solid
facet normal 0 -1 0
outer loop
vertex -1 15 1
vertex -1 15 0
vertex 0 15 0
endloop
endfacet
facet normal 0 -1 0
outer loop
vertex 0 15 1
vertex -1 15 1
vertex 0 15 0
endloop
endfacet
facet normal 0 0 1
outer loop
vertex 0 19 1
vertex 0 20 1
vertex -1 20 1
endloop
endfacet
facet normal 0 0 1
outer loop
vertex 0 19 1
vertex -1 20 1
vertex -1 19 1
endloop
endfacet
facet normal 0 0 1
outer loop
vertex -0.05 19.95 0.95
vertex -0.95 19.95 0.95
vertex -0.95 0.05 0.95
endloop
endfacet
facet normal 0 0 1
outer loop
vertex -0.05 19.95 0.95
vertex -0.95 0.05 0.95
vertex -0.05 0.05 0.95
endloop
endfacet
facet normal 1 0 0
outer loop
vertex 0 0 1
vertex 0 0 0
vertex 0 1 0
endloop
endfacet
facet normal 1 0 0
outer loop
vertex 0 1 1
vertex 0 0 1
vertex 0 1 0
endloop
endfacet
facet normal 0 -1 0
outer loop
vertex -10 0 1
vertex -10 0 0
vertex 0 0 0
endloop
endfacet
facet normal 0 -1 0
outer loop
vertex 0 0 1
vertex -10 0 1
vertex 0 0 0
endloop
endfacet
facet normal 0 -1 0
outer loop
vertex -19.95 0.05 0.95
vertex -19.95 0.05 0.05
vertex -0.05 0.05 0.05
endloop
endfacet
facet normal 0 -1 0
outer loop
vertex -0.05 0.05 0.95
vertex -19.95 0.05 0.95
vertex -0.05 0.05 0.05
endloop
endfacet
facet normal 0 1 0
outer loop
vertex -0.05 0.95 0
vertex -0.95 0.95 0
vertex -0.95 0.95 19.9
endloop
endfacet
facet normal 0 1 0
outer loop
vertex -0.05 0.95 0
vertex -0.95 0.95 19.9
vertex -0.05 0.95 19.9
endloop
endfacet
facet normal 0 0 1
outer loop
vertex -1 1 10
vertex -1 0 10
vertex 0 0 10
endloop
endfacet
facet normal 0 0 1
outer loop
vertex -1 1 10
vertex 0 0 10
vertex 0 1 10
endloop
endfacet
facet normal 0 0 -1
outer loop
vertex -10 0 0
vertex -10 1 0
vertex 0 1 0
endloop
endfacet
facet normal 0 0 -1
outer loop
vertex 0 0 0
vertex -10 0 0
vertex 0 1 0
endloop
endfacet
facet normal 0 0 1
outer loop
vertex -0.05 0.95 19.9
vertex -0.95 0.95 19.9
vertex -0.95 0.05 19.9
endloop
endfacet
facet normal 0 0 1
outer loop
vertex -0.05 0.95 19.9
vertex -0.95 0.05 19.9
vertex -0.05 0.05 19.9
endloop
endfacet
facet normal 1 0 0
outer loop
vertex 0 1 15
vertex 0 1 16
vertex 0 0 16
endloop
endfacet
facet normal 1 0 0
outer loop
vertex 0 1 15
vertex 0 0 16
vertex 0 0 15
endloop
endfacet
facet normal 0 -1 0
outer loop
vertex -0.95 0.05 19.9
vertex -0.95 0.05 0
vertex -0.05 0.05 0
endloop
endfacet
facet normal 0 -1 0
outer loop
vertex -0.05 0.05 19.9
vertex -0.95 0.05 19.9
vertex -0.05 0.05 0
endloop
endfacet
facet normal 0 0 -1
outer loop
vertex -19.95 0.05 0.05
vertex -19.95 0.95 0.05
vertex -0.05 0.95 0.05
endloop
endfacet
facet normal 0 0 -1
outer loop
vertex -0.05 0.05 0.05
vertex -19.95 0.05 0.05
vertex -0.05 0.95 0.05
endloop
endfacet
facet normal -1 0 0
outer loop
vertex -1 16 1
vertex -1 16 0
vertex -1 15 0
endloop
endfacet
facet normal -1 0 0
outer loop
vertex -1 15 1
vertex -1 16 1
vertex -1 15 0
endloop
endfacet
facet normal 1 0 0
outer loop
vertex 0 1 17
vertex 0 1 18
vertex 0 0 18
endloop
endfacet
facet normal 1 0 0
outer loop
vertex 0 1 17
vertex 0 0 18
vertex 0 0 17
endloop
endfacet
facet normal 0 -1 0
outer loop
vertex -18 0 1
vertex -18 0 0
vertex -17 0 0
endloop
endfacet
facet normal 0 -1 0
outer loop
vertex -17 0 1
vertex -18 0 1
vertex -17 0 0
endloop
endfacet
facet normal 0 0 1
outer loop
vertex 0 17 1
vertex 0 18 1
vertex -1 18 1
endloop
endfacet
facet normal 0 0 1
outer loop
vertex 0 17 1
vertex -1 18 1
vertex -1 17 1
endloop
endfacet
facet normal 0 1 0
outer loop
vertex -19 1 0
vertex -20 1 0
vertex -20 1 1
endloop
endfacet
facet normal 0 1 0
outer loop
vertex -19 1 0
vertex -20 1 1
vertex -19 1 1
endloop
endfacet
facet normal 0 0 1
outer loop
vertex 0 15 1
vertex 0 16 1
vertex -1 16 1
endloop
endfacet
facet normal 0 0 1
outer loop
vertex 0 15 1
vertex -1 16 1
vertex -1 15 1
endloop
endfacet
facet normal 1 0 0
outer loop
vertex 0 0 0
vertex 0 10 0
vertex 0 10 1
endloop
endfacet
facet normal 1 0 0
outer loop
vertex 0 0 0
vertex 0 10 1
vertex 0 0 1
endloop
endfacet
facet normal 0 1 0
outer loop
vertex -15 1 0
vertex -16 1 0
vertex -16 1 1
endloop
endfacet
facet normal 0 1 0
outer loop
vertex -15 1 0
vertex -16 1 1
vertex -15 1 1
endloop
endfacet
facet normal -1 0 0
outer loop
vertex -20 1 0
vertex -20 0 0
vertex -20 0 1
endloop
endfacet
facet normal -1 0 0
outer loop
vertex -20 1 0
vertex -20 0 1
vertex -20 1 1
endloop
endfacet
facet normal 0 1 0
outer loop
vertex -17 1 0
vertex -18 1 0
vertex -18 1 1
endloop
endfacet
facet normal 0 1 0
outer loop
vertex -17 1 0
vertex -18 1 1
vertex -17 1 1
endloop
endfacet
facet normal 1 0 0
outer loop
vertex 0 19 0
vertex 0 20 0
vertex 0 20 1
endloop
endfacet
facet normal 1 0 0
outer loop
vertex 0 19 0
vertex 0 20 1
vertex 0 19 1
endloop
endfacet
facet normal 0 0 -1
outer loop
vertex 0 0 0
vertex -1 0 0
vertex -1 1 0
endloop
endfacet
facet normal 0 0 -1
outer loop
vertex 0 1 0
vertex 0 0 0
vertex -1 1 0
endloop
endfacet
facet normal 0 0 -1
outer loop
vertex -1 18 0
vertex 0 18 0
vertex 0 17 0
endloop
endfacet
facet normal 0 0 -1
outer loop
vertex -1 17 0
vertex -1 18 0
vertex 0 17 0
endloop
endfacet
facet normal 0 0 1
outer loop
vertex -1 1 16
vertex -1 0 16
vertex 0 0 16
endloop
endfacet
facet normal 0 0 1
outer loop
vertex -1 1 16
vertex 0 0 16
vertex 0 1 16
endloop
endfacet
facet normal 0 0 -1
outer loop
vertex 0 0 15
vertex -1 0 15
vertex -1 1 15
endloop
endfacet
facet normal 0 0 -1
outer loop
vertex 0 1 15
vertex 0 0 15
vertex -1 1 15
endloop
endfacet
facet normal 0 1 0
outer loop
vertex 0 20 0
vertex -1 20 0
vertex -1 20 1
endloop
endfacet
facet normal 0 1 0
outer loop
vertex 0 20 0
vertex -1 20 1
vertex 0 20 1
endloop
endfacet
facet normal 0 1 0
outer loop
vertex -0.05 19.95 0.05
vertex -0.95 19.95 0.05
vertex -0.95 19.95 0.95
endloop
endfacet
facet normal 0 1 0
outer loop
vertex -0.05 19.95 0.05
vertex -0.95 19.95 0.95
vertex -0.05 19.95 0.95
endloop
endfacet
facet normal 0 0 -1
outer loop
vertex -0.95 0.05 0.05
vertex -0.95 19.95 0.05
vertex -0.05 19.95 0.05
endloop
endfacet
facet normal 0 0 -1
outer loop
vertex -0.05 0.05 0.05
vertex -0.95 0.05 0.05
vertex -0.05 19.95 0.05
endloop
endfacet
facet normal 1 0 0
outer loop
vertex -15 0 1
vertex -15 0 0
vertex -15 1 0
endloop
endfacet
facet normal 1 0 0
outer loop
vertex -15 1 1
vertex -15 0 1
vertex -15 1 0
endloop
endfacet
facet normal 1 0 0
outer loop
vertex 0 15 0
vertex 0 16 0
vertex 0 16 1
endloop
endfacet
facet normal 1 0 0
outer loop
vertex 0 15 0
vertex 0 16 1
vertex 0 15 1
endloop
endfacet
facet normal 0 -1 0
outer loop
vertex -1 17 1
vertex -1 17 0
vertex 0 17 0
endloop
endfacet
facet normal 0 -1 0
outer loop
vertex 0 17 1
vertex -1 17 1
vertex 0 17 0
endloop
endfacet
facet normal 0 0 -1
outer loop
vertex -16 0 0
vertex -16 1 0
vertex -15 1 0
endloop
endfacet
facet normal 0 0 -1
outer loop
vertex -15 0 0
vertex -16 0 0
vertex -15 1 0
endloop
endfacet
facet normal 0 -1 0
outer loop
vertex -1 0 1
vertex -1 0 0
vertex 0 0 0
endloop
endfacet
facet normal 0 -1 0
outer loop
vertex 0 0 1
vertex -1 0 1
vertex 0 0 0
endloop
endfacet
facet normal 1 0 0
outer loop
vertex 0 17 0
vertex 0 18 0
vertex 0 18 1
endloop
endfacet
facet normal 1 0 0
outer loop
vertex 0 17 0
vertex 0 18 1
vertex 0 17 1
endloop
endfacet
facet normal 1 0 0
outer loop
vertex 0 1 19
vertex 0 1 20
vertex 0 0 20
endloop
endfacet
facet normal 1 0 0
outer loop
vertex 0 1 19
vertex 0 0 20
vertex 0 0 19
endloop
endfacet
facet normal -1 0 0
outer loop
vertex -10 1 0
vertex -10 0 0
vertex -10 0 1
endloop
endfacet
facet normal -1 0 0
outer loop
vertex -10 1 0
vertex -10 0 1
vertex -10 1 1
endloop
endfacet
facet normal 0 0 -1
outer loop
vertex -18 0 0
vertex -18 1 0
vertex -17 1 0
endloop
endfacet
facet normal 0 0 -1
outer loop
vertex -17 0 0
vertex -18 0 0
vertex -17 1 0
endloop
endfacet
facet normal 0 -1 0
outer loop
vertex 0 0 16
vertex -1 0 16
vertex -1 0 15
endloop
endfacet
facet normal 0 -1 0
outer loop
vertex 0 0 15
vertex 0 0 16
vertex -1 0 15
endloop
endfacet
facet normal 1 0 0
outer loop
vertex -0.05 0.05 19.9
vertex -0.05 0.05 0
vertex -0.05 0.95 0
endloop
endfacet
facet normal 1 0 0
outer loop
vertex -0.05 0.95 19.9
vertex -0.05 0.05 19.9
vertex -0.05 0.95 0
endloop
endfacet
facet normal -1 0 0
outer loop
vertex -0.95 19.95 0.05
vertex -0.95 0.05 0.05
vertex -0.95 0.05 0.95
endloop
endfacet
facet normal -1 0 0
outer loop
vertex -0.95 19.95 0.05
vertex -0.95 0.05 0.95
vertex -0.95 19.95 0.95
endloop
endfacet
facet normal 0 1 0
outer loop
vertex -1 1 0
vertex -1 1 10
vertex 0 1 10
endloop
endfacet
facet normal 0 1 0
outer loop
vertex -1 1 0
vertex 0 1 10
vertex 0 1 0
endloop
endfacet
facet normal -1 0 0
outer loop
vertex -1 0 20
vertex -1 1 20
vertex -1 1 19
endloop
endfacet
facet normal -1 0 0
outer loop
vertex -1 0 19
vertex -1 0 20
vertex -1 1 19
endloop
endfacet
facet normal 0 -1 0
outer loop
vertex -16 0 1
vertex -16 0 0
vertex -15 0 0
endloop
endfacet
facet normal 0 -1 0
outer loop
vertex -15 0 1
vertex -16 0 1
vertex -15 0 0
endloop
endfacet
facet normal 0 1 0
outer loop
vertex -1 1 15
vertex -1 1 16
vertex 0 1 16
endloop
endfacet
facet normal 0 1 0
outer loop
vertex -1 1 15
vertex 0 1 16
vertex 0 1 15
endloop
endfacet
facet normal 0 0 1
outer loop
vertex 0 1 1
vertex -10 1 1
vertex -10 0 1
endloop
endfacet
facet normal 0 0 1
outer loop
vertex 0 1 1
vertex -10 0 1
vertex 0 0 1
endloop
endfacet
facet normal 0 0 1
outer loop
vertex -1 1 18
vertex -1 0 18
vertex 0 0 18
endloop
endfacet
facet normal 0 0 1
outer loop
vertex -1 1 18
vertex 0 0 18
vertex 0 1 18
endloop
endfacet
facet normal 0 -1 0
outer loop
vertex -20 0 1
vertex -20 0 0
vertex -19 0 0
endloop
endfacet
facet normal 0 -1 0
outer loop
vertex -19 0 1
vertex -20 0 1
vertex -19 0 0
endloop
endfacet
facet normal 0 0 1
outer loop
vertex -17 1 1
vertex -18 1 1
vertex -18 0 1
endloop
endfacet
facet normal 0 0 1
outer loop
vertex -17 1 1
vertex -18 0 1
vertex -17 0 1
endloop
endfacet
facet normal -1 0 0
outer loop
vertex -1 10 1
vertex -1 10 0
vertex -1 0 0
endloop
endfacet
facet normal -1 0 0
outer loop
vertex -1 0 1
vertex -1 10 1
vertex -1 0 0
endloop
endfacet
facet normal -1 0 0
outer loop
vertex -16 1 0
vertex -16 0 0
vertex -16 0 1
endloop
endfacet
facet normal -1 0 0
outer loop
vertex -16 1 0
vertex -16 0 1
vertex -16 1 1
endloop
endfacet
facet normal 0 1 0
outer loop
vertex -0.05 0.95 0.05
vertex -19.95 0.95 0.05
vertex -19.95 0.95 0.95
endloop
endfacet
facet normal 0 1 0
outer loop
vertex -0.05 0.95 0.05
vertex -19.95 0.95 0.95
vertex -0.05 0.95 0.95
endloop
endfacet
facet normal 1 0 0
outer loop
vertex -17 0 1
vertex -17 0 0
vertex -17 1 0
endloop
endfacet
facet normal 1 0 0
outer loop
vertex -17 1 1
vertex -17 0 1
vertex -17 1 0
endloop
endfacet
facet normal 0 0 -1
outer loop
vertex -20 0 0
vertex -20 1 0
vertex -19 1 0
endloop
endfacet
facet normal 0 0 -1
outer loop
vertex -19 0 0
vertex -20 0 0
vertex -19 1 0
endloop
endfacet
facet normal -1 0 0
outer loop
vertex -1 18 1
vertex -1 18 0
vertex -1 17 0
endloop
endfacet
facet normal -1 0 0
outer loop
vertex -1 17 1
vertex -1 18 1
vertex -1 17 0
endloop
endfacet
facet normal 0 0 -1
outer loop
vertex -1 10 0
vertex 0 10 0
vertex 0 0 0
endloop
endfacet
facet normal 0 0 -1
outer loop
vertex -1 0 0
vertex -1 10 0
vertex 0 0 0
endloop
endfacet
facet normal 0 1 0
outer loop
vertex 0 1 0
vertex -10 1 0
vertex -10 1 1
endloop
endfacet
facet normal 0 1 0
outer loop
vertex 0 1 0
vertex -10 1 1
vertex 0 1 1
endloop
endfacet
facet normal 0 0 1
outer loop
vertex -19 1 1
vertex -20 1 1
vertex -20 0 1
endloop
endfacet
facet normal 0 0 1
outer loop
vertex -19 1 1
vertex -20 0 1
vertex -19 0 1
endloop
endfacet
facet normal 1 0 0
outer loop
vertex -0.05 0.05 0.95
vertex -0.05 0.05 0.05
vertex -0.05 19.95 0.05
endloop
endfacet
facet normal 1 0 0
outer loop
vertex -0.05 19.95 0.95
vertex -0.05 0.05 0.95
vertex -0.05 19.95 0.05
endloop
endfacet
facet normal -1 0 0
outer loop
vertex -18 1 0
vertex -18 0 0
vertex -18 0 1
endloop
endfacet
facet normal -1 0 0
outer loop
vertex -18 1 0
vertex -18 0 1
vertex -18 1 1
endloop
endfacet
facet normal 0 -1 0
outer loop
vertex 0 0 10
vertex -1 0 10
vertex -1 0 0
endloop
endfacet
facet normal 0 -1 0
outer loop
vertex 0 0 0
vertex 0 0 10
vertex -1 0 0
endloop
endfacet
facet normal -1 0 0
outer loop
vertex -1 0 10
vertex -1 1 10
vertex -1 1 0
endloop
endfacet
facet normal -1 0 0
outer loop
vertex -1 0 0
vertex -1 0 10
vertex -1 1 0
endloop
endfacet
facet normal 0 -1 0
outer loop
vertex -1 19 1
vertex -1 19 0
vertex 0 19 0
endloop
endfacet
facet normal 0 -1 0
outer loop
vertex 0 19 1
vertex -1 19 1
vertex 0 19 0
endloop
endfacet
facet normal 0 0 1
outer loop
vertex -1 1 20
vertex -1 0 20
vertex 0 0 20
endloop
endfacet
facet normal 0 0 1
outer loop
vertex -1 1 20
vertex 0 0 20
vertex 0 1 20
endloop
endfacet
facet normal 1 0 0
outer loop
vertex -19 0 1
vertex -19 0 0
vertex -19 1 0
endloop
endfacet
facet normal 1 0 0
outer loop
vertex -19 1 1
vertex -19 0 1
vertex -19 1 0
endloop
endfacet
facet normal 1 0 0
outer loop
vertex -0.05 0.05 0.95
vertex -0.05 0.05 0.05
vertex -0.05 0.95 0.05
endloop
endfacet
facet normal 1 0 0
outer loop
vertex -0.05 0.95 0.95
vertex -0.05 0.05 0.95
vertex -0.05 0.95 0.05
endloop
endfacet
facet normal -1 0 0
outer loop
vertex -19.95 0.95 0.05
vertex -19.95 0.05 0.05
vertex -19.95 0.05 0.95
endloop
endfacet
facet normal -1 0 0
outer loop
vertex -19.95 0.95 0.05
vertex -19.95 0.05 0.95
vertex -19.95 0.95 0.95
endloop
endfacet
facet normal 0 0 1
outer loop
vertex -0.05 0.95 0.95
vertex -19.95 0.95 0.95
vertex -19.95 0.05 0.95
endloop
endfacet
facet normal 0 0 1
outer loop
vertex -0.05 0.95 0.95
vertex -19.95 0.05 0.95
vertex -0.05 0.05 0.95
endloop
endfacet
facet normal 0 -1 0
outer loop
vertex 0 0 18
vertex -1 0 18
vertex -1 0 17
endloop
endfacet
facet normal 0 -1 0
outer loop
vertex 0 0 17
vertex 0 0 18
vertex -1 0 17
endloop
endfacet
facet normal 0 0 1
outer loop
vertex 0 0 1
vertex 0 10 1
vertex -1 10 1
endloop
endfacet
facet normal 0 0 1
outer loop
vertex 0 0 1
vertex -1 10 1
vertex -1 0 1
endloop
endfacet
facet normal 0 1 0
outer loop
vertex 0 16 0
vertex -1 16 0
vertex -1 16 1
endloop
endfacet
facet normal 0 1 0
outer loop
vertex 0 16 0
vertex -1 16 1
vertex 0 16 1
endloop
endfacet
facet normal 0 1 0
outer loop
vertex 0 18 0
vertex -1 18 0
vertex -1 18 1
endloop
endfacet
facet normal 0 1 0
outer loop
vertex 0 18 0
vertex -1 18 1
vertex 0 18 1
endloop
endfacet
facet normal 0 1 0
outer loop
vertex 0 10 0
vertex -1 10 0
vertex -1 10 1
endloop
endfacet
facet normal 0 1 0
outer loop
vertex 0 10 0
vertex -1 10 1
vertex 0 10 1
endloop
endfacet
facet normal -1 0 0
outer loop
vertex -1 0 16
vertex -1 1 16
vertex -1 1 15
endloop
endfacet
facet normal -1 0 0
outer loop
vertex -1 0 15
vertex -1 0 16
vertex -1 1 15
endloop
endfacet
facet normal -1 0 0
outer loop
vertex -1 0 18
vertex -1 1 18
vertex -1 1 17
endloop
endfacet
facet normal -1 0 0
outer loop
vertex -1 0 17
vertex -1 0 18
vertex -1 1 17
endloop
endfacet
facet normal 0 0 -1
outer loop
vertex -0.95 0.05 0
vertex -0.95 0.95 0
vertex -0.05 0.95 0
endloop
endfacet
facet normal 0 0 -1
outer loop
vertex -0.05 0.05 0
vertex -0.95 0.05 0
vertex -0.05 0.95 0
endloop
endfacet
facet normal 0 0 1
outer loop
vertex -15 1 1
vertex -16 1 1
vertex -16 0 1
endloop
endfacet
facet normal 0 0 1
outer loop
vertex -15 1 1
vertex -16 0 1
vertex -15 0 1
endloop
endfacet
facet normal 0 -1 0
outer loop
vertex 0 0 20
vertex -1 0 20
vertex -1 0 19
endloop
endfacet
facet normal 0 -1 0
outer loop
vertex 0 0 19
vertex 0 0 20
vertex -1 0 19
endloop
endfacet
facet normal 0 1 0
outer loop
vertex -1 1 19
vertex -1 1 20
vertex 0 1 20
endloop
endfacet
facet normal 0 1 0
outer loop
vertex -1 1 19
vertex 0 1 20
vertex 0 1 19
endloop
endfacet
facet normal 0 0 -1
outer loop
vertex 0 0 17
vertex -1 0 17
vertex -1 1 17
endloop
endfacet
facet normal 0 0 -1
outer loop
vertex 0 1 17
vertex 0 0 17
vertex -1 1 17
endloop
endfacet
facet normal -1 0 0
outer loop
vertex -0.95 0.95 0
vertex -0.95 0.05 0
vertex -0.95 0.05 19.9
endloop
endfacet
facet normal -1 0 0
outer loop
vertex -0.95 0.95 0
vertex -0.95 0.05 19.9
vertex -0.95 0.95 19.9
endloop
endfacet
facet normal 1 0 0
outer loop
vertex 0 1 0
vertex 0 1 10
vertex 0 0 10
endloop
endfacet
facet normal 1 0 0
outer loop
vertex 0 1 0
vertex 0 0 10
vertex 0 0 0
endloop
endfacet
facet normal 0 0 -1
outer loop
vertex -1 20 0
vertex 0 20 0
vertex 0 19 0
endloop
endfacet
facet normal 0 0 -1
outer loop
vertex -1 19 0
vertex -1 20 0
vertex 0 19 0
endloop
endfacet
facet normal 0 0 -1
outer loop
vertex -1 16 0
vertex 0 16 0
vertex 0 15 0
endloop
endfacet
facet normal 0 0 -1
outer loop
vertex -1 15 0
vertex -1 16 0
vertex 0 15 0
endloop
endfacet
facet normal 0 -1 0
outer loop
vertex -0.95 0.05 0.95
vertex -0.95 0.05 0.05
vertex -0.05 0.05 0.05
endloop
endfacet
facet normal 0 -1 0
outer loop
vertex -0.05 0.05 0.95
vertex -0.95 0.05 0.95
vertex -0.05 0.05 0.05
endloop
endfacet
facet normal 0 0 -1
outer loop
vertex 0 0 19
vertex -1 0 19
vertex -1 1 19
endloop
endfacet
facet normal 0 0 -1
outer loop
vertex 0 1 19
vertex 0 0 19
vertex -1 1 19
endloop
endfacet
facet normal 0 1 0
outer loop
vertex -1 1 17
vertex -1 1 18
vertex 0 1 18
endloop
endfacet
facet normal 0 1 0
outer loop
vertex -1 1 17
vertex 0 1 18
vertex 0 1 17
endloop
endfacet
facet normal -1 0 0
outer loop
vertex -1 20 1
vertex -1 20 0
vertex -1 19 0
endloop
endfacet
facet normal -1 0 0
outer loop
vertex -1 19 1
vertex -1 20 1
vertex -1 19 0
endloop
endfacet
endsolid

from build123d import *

# Parameters (mm, degrees)
BOX_W        = 10
BOX_H        = 1
BOX_DEPTH    = 1
BOX001_W     = 1
BOX001_H     = 1
BOX001_DEPTH = 1
BOX002_W     = 1
BOX002_H     = 1
BOX002_DEPTH = 1
BOX003_W     = 1
BOX003_H     = 1
BOX003_DEPTH = 1
BOX004_W     = 10
BOX004_H     = 1
BOX004_DEPTH = 1
BOX005_W     = 1
BOX005_H     = 1
BOX005_DEPTH = 1
BOX006_W     = 1
BOX006_H     = 1
BOX006_DEPTH = 1
BOX007_W     = 1
BOX007_H     = 1
BOX007_DEPTH = 1
BOX010_W     = 1
BOX010_H     = 1
BOX010_DEPTH = 1
BOX008_W     = 10
BOX008_H     = 1
BOX008_DEPTH = 1
BOX009_W     = 1
BOX009_H     = 1
BOX009_DEPTH = 1
BOX011_W     = 1
BOX011_H     = 1
BOX011_DEPTH = 1
BOX012_W     = 0.9
BOX012_H     = 0.9
BOX012_DEPTH = 19.9
BOX013_W     = 19.9
BOX013_H     = 0.9
BOX013_DEPTH = 0.9
BOX014_W     = 0.9
BOX014_H     = 19.9
BOX014_DEPTH = 0.9


with BuildPart() as cube:
    # Box → Box (new body)
    with BuildSketch(Plane(origin=(-10, 0, 0), x_dir=(1, 0, 0), z_dir=(0, 0, 1))):
        with Locations((5, 0.5)):
            Rectangle(BOX_W, BOX_H)
    extrude(amount=BOX_DEPTH)


with BuildPart() as cube001:
    # Box001 → Box001 (new body)
    with BuildSketch(Plane(origin=(-16, 0, 0), x_dir=(1, 0, 0), z_dir=(0, 0, 1))):
        with Locations((0.5, 0.5)):
            Rectangle(BOX001_W, BOX001_H)
    extrude(amount=BOX001_DEPTH)


with BuildPart() as cube002:
    # Box002 → Box002 (new body)
    with BuildSketch(Plane(origin=(-18, 0, 0), x_dir=(1, 0, 0), z_dir=(0, 0, 1))):
        with Locations((0.5, 0.5)):
            Rectangle(BOX002_W, BOX002_H)
    extrude(amount=BOX002_DEPTH)


with BuildPart() as cube003:
    # Box003 → Box003 (new body)
    with BuildSketch(Plane(origin=(-20, 0, 0), x_dir=(1, 0, 0), z_dir=(0, 0, 1))):
        with Locations((0.5, 0.5)):
            Rectangle(BOX003_W, BOX003_H)
    extrude(amount=BOX003_DEPTH)


with BuildPart() as cube004:
    # Box004 → Box004 (new body)
    with BuildSketch(Plane(origin=(-1, 10, 0), x_dir=(0, -1, 0), z_dir=(0, 0, 1))):
        with Locations((5, 0.5)):
            Rectangle(BOX004_W, BOX004_H)
    extrude(amount=BOX004_DEPTH)


with BuildPart() as cube005:
    # Box005 → Box005 (new body)
    with BuildSketch(Plane(origin=(-1, 16, 0), x_dir=(0, -1, 0), z_dir=(0, 0, 1))):
        with Locations((0.5, 0.5)):
            Rectangle(BOX005_W, BOX005_H)
    extrude(amount=BOX005_DEPTH)


with BuildPart() as cube006:
    # Box006 → Box006 (new body)
    with BuildSketch(Plane(origin=(-1, 18, 0), x_dir=(0, -1, 0), z_dir=(0, 0, 1))):
        with Locations((0.5, 0.5)):
            Rectangle(BOX006_W, BOX006_H)
    extrude(amount=BOX006_DEPTH)


with BuildPart() as cube007:
    # Box007 → Box007 (new body)
    with BuildSketch(Plane(origin=(-1, 20, 0), x_dir=(0, -1, 0), z_dir=(0, 0, 1))):
        with Locations((0.5, 0.5)):
            Rectangle(BOX007_W, BOX007_H)
    extrude(amount=BOX007_DEPTH)


with BuildPart() as cube010:
    # Box010 → Box010 (new body)
    with BuildSketch(Plane(origin=(-1, 0, 18), x_dir=(0, 0, -1), z_dir=(1, 0, 0))):
        with Locations((0.5, 0.5)):
            Rectangle(BOX010_W, BOX010_H)
    extrude(amount=BOX010_DEPTH)


with BuildPart() as cube008:
    # Box008 → Box008 (new body)
    with BuildSketch(Plane(origin=(-1, 0, 10), x_dir=(0, 0, -1), z_dir=(1, 0, 0))):
        with Locations((5, 0.5)):
            Rectangle(BOX008_W, BOX008_H)
    extrude(amount=BOX008_DEPTH)


with BuildPart() as cube009:
    # Box009 → Box009 (new body)
    with BuildSketch(Plane(origin=(-1, 0, 16), x_dir=(0, 0, -1), z_dir=(1, 0, 0))):
        with Locations((0.5, 0.5)):
            Rectangle(BOX009_W, BOX009_H)
    extrude(amount=BOX009_DEPTH)


with BuildPart() as cube011:
    # Box011 → Box011 (new body)
    with BuildSketch(Plane(origin=(-1, 0, 20), x_dir=(0, 0, -1), z_dir=(1, 0, 0))):
        with Locations((0.5, 0.5)):
            Rectangle(BOX011_W, BOX011_H)
    extrude(amount=BOX011_DEPTH)


with BuildPart() as cube012:
    # Box012 → Box012 (new body)
    with BuildSketch(Plane(origin=(-0.95, 0.05, 0), x_dir=(1, 0, 0), z_dir=(0, 0, 1))):
        with Locations((0.45, 0.45)):
            Rectangle(BOX012_W, BOX012_H)
    extrude(amount=BOX012_DEPTH)


with BuildPart() as cube013:
    # Box013 → Box013 (new body)
    with BuildSketch(Plane(origin=(-19.95, 0.05, 0.05), x_dir=(1, 0, 0), z_dir=(0, 0, 1))):
        with Locations((9.95, 0.45)):
            Rectangle(BOX013_W, BOX013_H)
    extrude(amount=BOX013_DEPTH)


with BuildPart() as cube014:
    # Box014 → Box014 (new body)
    with BuildSketch(Plane(origin=(-0.95, 0.05, 0.05), x_dir=(1, 0, 0), z_dir=(0, 0, 1))):
        with Locations((0.45, 9.95)):
            Rectangle(BOX014_W, BOX014_H)
    extrude(amount=BOX014_DEPTH)


solid = Compound([cube.part, cube001.part, cube002.part, cube003.part, cube004.part, cube005.part, cube006.part, cube007.part, cube010.part, cube008.part, cube009.part, cube011.part, cube012.part, cube013.part, cube014.part])
